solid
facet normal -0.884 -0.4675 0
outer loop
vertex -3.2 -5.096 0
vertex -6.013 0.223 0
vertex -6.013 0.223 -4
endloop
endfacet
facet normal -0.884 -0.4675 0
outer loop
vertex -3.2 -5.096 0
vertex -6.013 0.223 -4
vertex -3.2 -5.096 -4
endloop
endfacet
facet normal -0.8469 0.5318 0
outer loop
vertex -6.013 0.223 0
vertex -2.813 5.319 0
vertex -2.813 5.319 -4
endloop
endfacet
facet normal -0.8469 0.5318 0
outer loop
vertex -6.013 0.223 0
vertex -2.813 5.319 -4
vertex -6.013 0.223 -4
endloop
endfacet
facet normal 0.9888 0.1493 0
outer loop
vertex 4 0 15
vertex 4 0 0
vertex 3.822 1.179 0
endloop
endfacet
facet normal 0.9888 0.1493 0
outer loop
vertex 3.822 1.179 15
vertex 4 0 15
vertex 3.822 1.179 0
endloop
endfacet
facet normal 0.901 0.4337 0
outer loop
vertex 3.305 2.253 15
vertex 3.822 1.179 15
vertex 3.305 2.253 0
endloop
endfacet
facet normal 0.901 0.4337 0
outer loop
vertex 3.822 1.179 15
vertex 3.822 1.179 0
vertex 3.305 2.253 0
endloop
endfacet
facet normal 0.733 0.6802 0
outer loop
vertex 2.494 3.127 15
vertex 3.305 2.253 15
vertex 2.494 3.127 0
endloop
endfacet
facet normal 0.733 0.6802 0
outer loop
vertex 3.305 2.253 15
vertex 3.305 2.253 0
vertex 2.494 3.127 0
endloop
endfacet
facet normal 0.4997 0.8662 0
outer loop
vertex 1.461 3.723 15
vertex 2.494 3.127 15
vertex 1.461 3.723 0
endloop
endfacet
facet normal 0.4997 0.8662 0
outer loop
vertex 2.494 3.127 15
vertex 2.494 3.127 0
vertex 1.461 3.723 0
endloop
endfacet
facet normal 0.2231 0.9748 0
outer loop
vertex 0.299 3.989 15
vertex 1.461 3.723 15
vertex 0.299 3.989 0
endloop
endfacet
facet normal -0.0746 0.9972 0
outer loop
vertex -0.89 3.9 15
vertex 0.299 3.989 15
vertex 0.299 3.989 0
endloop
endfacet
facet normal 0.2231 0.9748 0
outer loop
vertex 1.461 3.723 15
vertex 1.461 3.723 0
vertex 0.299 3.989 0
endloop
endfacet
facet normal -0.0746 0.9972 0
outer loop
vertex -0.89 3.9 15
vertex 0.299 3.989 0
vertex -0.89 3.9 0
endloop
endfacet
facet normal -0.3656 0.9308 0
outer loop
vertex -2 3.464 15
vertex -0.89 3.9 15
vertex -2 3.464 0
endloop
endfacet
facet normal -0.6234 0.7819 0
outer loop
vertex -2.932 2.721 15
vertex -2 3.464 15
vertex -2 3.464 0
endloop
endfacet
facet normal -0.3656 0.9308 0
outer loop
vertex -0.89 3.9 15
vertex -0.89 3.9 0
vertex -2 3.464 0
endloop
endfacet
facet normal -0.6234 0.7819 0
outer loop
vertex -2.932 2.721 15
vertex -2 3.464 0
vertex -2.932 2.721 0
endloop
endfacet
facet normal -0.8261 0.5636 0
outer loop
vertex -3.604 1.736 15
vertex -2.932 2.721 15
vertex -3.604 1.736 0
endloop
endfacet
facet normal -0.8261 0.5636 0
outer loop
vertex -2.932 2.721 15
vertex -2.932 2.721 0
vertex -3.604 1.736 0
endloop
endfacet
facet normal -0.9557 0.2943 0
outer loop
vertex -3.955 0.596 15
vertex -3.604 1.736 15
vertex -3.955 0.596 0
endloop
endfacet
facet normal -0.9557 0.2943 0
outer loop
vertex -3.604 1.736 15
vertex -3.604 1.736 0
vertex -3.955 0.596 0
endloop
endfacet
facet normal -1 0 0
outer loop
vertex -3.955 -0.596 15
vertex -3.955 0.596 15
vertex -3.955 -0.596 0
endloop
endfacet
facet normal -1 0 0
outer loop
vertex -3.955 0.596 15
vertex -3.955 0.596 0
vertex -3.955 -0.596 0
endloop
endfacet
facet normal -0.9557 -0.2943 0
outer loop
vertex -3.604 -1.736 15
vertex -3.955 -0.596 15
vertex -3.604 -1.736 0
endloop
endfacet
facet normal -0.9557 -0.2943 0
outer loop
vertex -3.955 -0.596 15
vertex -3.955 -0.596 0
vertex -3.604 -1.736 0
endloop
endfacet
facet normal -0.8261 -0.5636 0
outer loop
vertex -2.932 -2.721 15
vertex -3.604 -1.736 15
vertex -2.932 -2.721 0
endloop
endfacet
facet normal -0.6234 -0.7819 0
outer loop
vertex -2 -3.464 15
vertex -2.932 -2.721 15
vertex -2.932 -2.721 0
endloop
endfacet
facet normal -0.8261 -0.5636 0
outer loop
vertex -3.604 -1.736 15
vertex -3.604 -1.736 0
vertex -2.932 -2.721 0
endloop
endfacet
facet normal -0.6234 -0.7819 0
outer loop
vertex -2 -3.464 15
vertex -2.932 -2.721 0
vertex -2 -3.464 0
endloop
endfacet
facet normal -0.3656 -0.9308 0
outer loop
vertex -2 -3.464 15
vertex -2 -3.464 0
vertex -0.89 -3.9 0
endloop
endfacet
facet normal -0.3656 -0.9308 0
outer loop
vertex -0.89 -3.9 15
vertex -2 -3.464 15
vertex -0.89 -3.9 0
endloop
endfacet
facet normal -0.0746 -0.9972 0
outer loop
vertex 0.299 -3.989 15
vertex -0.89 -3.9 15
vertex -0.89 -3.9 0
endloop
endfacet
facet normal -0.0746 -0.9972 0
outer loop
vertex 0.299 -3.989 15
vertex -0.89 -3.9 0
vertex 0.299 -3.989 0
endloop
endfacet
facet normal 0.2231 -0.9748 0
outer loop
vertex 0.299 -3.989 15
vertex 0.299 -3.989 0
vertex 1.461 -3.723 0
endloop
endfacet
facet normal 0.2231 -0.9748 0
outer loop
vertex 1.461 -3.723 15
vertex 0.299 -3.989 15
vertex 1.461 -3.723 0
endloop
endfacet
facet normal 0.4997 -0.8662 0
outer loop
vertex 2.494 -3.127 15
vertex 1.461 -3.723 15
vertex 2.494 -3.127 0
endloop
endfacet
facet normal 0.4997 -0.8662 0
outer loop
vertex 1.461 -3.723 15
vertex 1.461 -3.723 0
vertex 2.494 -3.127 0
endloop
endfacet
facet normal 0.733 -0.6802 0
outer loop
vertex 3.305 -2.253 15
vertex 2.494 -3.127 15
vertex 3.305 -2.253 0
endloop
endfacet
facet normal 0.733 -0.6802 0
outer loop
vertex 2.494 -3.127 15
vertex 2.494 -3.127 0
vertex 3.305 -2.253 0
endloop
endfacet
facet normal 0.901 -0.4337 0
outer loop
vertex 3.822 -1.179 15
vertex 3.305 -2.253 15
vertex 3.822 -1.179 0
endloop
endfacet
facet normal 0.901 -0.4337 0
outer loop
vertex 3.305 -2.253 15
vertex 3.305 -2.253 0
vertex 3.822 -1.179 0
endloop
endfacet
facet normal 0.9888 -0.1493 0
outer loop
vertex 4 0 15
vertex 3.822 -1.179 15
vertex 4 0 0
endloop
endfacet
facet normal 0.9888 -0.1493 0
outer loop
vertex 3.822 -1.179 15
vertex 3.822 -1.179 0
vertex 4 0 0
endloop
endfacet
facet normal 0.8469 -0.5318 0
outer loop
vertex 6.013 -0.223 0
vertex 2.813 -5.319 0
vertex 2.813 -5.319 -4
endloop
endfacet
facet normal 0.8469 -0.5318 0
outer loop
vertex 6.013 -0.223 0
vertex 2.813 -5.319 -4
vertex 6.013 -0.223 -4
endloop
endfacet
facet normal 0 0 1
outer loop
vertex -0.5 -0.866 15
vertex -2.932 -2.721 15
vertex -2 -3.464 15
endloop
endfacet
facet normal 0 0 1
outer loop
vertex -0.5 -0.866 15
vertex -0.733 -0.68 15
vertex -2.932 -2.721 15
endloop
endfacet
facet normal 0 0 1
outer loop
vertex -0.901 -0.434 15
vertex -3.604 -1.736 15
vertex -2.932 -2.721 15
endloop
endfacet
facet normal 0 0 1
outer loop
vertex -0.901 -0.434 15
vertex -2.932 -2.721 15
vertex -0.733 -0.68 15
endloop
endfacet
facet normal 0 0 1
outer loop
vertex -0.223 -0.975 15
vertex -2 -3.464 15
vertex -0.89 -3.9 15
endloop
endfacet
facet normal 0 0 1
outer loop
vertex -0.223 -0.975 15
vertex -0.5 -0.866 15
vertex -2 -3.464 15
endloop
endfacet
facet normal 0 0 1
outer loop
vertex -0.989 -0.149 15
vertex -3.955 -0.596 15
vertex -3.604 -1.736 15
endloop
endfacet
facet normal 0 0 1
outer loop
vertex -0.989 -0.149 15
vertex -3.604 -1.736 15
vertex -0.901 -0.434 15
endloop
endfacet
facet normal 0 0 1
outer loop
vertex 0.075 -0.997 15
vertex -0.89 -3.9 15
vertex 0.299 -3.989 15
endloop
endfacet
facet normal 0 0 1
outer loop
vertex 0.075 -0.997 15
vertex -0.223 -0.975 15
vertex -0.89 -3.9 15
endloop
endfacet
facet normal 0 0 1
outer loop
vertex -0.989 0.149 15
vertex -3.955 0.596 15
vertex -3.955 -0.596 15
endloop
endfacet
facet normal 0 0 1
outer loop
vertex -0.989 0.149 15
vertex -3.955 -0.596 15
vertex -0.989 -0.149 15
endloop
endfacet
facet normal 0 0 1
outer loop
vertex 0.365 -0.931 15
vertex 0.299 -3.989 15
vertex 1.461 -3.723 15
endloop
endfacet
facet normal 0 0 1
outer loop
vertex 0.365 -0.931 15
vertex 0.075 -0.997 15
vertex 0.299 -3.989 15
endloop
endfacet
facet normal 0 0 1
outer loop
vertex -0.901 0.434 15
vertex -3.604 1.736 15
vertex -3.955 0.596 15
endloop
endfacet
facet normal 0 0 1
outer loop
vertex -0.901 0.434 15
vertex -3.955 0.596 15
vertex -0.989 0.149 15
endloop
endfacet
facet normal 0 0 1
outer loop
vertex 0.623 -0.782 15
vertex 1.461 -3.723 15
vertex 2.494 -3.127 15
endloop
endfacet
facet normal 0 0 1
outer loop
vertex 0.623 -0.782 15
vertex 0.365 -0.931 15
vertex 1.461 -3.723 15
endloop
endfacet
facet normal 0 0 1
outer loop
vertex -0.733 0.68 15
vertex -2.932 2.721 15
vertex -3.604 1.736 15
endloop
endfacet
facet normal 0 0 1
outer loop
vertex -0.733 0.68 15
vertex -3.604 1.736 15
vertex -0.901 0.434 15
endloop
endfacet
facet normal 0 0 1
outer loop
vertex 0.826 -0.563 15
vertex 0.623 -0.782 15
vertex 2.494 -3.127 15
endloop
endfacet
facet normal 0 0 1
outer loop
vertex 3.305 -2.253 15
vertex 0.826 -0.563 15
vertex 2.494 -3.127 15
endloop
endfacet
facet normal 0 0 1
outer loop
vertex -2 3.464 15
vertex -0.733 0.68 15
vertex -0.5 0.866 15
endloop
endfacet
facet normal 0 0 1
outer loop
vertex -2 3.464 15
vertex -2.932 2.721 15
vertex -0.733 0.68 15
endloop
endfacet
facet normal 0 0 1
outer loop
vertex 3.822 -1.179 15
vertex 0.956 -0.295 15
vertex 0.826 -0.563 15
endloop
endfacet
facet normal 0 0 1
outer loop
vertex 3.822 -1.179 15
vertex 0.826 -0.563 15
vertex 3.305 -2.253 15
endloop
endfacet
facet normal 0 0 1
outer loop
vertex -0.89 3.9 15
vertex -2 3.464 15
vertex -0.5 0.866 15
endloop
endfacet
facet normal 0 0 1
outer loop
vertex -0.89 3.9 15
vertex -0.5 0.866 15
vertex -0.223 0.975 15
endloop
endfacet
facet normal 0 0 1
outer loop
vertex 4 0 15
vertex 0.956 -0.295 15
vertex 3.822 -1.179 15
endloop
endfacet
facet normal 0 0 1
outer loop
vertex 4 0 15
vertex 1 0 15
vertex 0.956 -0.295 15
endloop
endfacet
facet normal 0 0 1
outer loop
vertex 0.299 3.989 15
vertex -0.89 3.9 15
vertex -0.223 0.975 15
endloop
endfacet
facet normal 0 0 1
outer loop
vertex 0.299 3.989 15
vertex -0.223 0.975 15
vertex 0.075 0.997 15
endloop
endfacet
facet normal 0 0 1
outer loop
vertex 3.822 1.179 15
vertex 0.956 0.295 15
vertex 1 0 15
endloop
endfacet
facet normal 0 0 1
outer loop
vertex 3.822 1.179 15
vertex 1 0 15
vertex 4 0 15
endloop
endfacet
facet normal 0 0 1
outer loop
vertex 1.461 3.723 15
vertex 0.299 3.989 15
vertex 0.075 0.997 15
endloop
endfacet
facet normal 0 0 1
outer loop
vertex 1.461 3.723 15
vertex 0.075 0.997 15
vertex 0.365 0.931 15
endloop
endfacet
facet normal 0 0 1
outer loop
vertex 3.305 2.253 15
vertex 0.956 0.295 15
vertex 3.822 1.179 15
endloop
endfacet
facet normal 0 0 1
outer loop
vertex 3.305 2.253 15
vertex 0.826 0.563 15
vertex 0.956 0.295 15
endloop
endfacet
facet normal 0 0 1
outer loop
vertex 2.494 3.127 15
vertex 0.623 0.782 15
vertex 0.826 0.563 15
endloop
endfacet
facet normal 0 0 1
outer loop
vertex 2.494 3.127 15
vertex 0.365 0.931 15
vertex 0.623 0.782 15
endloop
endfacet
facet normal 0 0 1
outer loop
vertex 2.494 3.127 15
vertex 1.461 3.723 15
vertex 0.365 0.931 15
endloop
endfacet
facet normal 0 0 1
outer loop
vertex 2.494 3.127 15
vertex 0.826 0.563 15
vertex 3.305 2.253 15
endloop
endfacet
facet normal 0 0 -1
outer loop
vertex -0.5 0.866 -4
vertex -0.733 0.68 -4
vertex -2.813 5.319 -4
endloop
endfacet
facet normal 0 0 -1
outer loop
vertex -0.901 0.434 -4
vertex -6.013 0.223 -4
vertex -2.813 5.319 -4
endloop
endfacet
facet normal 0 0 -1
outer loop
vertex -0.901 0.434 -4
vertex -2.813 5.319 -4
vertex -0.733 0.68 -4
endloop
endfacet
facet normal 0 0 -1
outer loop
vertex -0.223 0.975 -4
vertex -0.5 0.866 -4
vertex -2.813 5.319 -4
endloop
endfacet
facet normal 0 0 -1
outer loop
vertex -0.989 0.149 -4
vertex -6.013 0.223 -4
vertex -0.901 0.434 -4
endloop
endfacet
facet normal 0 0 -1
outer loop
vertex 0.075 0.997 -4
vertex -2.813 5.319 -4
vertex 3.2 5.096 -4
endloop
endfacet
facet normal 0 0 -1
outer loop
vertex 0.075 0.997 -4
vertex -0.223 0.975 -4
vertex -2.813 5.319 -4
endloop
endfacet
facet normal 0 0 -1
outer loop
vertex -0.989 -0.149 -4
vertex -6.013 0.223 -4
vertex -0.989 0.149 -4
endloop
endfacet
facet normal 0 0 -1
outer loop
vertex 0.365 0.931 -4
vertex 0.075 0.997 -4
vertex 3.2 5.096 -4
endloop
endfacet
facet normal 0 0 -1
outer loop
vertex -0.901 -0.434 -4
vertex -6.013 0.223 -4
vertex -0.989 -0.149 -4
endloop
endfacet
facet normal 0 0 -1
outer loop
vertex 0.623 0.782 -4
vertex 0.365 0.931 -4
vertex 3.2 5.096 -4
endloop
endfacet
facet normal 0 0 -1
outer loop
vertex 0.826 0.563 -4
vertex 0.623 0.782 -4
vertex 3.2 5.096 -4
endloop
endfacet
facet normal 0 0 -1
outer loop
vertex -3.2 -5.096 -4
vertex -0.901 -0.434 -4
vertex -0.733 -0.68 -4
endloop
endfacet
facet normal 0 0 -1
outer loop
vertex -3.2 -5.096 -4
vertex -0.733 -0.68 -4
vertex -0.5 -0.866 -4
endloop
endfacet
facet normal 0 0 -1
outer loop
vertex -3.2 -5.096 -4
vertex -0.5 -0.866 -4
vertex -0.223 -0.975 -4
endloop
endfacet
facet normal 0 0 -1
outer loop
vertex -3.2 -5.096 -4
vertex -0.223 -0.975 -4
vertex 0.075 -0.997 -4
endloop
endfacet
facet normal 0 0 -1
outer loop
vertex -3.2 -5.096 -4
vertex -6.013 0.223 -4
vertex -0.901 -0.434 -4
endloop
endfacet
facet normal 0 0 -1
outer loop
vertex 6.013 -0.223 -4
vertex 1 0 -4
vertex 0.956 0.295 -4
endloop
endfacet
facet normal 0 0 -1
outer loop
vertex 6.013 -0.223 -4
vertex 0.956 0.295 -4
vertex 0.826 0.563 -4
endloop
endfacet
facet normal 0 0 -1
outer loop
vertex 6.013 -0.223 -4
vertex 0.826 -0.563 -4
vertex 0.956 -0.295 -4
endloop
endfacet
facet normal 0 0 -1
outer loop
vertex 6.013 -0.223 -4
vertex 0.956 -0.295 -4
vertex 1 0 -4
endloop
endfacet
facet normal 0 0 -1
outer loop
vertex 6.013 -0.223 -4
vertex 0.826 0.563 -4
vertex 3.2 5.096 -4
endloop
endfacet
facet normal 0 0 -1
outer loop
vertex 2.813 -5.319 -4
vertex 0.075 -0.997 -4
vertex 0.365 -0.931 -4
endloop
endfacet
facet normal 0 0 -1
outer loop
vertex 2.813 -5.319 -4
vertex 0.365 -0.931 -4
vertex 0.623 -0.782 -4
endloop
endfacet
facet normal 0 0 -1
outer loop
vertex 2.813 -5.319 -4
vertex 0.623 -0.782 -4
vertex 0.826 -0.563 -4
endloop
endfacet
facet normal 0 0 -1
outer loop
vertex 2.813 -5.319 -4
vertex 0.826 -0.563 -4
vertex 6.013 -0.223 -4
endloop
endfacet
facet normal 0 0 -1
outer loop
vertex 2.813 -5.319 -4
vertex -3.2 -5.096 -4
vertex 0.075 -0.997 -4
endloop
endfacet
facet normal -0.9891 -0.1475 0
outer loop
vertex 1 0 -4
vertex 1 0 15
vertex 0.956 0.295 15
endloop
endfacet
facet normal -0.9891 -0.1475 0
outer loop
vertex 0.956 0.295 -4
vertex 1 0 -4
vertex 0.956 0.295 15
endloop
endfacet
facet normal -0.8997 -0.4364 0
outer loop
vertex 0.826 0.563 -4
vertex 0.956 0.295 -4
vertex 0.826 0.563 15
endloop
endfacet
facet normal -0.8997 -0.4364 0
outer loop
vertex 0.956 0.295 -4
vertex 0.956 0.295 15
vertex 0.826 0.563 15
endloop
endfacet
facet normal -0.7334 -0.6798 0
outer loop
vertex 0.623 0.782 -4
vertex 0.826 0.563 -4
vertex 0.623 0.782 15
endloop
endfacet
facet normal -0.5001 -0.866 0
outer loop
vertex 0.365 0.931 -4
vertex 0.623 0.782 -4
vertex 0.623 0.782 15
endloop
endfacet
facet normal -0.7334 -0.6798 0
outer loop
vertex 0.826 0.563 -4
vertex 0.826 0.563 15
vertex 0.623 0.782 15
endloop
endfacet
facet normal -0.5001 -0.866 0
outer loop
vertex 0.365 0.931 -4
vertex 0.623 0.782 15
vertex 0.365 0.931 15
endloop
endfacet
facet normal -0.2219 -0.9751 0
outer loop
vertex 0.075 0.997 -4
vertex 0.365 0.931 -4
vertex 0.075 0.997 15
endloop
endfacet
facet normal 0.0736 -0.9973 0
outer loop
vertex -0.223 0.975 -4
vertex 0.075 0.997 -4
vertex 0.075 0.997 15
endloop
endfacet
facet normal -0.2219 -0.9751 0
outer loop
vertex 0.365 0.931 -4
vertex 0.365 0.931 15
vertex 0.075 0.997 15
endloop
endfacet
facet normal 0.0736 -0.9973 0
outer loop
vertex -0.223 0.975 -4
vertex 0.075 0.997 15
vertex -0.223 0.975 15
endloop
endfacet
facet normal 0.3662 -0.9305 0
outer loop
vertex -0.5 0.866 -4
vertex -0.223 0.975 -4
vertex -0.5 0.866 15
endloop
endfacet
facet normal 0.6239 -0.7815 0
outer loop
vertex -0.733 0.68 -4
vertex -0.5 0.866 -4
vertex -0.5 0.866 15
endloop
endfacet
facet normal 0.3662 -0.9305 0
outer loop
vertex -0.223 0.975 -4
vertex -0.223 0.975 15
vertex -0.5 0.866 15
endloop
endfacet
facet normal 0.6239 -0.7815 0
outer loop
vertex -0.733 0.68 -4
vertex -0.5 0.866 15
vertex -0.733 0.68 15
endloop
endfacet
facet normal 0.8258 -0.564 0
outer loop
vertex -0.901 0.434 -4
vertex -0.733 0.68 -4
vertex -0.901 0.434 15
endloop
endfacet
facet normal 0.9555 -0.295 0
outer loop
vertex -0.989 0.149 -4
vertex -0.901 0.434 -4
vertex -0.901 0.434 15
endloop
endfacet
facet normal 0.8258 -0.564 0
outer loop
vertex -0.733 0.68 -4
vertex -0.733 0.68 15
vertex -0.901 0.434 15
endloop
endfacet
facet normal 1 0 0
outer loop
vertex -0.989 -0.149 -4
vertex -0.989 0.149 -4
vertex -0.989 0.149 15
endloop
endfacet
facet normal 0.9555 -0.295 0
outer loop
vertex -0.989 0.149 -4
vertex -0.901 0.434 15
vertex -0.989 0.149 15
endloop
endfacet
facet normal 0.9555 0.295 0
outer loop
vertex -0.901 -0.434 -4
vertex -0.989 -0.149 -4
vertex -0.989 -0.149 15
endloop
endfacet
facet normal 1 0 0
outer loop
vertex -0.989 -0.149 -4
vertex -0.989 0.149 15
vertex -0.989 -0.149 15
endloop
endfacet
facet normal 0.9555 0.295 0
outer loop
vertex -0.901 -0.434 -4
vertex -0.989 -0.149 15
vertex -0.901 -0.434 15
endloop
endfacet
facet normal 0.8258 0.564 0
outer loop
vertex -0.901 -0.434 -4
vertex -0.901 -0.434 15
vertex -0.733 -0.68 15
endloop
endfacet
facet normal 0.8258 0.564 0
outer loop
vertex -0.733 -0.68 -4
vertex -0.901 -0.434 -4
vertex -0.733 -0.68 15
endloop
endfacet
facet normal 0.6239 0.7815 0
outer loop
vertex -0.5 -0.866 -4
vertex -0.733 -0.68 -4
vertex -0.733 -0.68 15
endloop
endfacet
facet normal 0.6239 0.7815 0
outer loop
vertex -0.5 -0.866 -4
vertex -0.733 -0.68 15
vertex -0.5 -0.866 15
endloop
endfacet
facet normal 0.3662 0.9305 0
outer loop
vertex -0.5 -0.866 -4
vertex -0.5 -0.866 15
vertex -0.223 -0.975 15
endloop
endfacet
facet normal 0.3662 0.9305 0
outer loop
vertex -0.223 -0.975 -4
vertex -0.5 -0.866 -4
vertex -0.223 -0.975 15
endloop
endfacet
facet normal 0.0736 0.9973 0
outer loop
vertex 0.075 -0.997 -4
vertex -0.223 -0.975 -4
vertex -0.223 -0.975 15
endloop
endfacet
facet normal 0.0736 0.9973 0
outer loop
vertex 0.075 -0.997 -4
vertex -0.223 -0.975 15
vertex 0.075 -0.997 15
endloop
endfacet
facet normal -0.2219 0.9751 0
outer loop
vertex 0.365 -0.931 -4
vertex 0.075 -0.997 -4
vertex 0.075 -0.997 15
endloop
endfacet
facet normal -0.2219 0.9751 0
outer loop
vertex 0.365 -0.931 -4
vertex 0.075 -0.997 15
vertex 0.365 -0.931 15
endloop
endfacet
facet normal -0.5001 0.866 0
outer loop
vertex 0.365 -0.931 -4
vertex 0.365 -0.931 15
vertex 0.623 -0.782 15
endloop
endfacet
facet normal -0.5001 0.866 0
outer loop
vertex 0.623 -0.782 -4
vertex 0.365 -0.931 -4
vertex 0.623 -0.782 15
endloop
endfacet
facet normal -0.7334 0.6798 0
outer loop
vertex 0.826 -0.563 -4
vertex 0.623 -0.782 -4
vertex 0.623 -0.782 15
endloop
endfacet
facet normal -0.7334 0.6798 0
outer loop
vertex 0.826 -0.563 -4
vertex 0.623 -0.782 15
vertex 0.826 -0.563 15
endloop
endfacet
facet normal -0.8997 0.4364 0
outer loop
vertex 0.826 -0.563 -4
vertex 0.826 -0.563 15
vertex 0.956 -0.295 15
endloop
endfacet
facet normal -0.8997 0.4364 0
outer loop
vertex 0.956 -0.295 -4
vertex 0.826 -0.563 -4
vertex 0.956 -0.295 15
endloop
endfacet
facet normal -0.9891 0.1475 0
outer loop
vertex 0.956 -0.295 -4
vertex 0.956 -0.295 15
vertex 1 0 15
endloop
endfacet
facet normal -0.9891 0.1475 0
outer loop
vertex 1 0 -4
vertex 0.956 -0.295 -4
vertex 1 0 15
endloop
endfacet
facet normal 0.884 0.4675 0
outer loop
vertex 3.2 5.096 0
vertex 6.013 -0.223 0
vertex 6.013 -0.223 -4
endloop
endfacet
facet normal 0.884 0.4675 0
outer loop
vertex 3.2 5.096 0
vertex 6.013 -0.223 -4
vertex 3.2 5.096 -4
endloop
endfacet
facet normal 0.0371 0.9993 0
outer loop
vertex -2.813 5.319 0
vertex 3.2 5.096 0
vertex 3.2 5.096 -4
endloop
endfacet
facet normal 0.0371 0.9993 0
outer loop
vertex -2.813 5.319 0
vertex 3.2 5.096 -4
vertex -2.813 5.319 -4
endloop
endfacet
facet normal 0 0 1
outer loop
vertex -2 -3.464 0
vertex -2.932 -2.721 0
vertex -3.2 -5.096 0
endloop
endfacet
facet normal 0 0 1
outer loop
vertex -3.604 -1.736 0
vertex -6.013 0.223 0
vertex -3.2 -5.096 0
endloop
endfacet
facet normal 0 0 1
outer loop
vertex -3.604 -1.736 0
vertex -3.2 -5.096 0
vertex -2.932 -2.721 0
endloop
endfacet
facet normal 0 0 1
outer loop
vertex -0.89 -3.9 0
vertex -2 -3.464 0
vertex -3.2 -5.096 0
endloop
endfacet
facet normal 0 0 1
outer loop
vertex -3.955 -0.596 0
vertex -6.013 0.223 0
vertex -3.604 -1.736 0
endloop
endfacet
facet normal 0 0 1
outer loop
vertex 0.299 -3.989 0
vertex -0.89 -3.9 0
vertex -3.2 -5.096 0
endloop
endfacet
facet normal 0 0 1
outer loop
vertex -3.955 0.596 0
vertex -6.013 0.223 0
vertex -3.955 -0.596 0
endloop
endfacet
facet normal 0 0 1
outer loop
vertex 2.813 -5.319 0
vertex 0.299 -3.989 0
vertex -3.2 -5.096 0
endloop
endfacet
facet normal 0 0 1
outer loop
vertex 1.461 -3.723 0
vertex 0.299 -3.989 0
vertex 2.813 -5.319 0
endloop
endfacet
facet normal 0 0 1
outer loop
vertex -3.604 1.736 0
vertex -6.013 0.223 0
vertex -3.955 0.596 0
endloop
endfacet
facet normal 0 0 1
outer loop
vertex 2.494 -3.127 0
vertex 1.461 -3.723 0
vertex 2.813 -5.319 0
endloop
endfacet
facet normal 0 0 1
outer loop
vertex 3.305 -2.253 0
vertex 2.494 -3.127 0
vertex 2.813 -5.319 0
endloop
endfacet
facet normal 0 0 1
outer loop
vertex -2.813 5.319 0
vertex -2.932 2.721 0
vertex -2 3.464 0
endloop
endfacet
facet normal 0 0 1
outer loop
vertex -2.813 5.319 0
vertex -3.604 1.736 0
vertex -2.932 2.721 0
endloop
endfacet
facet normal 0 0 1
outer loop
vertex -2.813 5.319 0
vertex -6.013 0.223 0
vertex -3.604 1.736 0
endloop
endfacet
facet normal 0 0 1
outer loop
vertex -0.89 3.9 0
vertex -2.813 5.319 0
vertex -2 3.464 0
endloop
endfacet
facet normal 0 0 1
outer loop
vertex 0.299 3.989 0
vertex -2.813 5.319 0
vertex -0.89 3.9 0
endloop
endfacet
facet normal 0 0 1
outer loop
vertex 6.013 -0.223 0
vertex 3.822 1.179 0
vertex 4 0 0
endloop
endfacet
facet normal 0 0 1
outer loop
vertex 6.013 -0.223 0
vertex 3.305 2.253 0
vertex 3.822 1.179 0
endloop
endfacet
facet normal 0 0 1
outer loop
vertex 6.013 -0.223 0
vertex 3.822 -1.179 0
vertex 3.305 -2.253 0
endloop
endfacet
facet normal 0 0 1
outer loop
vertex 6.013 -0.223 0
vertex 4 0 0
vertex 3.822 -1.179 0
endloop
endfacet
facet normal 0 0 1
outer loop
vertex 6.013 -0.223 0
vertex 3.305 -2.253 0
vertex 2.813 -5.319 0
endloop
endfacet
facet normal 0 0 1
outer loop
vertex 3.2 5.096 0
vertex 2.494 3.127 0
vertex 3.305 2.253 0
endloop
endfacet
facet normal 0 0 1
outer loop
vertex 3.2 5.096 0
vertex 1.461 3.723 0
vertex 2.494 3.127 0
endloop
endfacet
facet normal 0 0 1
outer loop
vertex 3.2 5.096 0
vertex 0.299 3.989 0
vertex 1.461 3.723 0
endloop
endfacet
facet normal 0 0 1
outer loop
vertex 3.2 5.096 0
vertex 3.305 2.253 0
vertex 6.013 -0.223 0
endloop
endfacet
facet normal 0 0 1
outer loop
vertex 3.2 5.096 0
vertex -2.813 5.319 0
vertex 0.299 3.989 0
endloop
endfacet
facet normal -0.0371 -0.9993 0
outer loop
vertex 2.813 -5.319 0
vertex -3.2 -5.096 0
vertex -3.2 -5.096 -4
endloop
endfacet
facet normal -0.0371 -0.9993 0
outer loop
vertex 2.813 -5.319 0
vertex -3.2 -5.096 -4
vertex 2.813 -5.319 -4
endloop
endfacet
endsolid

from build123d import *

# Parameters (mm, degrees)
F0_R      = 4
F1_DEPTH  = 15
F1_FACE_R = 4
F2_DEPTH  = 4
F3_R      = 1
F4_DEPTH  = 19.001


with BuildPart() as f1:
    # F0 (on Top) → F1 (new body)
    with BuildSketch(Plane.XY):
        Circle(F0_R)
    extrude(amount=F1_DEPTH)

    # F1_face (on face) + F0 (on Top) → F2 (join)
    with BuildSketch(Plane(origin=(0, 0, 0), x_dir=(1, 0, 0), z_dir=(0, 0, -1))):
        Circle(F1_FACE_R)
    with BuildSketch(Plane.XY):
        Polygon((6.0127749436, -0.2231464057), (3.1996379279, 5.0956426455), (-2.8131370157, 5.3187890512), (-6.0127749436, 0.2231464057), (-3.1996379279, -5.0956426455), (2.8131370157, -5.3187890512), align=None)
        Circle(F0_R, mode=Mode.SUBTRACT)
    extrude(amount=F2_DEPTH, dir=(0, 0, -1))

    # F3 (on face) → F4 (cut, through all)
    with BuildSketch(Plane.XY.offset(15)):
        Circle(F3_R)
    extrude(amount=-F4_DEPTH, mode=Mode.SUBTRACT)


solid = f1.part
